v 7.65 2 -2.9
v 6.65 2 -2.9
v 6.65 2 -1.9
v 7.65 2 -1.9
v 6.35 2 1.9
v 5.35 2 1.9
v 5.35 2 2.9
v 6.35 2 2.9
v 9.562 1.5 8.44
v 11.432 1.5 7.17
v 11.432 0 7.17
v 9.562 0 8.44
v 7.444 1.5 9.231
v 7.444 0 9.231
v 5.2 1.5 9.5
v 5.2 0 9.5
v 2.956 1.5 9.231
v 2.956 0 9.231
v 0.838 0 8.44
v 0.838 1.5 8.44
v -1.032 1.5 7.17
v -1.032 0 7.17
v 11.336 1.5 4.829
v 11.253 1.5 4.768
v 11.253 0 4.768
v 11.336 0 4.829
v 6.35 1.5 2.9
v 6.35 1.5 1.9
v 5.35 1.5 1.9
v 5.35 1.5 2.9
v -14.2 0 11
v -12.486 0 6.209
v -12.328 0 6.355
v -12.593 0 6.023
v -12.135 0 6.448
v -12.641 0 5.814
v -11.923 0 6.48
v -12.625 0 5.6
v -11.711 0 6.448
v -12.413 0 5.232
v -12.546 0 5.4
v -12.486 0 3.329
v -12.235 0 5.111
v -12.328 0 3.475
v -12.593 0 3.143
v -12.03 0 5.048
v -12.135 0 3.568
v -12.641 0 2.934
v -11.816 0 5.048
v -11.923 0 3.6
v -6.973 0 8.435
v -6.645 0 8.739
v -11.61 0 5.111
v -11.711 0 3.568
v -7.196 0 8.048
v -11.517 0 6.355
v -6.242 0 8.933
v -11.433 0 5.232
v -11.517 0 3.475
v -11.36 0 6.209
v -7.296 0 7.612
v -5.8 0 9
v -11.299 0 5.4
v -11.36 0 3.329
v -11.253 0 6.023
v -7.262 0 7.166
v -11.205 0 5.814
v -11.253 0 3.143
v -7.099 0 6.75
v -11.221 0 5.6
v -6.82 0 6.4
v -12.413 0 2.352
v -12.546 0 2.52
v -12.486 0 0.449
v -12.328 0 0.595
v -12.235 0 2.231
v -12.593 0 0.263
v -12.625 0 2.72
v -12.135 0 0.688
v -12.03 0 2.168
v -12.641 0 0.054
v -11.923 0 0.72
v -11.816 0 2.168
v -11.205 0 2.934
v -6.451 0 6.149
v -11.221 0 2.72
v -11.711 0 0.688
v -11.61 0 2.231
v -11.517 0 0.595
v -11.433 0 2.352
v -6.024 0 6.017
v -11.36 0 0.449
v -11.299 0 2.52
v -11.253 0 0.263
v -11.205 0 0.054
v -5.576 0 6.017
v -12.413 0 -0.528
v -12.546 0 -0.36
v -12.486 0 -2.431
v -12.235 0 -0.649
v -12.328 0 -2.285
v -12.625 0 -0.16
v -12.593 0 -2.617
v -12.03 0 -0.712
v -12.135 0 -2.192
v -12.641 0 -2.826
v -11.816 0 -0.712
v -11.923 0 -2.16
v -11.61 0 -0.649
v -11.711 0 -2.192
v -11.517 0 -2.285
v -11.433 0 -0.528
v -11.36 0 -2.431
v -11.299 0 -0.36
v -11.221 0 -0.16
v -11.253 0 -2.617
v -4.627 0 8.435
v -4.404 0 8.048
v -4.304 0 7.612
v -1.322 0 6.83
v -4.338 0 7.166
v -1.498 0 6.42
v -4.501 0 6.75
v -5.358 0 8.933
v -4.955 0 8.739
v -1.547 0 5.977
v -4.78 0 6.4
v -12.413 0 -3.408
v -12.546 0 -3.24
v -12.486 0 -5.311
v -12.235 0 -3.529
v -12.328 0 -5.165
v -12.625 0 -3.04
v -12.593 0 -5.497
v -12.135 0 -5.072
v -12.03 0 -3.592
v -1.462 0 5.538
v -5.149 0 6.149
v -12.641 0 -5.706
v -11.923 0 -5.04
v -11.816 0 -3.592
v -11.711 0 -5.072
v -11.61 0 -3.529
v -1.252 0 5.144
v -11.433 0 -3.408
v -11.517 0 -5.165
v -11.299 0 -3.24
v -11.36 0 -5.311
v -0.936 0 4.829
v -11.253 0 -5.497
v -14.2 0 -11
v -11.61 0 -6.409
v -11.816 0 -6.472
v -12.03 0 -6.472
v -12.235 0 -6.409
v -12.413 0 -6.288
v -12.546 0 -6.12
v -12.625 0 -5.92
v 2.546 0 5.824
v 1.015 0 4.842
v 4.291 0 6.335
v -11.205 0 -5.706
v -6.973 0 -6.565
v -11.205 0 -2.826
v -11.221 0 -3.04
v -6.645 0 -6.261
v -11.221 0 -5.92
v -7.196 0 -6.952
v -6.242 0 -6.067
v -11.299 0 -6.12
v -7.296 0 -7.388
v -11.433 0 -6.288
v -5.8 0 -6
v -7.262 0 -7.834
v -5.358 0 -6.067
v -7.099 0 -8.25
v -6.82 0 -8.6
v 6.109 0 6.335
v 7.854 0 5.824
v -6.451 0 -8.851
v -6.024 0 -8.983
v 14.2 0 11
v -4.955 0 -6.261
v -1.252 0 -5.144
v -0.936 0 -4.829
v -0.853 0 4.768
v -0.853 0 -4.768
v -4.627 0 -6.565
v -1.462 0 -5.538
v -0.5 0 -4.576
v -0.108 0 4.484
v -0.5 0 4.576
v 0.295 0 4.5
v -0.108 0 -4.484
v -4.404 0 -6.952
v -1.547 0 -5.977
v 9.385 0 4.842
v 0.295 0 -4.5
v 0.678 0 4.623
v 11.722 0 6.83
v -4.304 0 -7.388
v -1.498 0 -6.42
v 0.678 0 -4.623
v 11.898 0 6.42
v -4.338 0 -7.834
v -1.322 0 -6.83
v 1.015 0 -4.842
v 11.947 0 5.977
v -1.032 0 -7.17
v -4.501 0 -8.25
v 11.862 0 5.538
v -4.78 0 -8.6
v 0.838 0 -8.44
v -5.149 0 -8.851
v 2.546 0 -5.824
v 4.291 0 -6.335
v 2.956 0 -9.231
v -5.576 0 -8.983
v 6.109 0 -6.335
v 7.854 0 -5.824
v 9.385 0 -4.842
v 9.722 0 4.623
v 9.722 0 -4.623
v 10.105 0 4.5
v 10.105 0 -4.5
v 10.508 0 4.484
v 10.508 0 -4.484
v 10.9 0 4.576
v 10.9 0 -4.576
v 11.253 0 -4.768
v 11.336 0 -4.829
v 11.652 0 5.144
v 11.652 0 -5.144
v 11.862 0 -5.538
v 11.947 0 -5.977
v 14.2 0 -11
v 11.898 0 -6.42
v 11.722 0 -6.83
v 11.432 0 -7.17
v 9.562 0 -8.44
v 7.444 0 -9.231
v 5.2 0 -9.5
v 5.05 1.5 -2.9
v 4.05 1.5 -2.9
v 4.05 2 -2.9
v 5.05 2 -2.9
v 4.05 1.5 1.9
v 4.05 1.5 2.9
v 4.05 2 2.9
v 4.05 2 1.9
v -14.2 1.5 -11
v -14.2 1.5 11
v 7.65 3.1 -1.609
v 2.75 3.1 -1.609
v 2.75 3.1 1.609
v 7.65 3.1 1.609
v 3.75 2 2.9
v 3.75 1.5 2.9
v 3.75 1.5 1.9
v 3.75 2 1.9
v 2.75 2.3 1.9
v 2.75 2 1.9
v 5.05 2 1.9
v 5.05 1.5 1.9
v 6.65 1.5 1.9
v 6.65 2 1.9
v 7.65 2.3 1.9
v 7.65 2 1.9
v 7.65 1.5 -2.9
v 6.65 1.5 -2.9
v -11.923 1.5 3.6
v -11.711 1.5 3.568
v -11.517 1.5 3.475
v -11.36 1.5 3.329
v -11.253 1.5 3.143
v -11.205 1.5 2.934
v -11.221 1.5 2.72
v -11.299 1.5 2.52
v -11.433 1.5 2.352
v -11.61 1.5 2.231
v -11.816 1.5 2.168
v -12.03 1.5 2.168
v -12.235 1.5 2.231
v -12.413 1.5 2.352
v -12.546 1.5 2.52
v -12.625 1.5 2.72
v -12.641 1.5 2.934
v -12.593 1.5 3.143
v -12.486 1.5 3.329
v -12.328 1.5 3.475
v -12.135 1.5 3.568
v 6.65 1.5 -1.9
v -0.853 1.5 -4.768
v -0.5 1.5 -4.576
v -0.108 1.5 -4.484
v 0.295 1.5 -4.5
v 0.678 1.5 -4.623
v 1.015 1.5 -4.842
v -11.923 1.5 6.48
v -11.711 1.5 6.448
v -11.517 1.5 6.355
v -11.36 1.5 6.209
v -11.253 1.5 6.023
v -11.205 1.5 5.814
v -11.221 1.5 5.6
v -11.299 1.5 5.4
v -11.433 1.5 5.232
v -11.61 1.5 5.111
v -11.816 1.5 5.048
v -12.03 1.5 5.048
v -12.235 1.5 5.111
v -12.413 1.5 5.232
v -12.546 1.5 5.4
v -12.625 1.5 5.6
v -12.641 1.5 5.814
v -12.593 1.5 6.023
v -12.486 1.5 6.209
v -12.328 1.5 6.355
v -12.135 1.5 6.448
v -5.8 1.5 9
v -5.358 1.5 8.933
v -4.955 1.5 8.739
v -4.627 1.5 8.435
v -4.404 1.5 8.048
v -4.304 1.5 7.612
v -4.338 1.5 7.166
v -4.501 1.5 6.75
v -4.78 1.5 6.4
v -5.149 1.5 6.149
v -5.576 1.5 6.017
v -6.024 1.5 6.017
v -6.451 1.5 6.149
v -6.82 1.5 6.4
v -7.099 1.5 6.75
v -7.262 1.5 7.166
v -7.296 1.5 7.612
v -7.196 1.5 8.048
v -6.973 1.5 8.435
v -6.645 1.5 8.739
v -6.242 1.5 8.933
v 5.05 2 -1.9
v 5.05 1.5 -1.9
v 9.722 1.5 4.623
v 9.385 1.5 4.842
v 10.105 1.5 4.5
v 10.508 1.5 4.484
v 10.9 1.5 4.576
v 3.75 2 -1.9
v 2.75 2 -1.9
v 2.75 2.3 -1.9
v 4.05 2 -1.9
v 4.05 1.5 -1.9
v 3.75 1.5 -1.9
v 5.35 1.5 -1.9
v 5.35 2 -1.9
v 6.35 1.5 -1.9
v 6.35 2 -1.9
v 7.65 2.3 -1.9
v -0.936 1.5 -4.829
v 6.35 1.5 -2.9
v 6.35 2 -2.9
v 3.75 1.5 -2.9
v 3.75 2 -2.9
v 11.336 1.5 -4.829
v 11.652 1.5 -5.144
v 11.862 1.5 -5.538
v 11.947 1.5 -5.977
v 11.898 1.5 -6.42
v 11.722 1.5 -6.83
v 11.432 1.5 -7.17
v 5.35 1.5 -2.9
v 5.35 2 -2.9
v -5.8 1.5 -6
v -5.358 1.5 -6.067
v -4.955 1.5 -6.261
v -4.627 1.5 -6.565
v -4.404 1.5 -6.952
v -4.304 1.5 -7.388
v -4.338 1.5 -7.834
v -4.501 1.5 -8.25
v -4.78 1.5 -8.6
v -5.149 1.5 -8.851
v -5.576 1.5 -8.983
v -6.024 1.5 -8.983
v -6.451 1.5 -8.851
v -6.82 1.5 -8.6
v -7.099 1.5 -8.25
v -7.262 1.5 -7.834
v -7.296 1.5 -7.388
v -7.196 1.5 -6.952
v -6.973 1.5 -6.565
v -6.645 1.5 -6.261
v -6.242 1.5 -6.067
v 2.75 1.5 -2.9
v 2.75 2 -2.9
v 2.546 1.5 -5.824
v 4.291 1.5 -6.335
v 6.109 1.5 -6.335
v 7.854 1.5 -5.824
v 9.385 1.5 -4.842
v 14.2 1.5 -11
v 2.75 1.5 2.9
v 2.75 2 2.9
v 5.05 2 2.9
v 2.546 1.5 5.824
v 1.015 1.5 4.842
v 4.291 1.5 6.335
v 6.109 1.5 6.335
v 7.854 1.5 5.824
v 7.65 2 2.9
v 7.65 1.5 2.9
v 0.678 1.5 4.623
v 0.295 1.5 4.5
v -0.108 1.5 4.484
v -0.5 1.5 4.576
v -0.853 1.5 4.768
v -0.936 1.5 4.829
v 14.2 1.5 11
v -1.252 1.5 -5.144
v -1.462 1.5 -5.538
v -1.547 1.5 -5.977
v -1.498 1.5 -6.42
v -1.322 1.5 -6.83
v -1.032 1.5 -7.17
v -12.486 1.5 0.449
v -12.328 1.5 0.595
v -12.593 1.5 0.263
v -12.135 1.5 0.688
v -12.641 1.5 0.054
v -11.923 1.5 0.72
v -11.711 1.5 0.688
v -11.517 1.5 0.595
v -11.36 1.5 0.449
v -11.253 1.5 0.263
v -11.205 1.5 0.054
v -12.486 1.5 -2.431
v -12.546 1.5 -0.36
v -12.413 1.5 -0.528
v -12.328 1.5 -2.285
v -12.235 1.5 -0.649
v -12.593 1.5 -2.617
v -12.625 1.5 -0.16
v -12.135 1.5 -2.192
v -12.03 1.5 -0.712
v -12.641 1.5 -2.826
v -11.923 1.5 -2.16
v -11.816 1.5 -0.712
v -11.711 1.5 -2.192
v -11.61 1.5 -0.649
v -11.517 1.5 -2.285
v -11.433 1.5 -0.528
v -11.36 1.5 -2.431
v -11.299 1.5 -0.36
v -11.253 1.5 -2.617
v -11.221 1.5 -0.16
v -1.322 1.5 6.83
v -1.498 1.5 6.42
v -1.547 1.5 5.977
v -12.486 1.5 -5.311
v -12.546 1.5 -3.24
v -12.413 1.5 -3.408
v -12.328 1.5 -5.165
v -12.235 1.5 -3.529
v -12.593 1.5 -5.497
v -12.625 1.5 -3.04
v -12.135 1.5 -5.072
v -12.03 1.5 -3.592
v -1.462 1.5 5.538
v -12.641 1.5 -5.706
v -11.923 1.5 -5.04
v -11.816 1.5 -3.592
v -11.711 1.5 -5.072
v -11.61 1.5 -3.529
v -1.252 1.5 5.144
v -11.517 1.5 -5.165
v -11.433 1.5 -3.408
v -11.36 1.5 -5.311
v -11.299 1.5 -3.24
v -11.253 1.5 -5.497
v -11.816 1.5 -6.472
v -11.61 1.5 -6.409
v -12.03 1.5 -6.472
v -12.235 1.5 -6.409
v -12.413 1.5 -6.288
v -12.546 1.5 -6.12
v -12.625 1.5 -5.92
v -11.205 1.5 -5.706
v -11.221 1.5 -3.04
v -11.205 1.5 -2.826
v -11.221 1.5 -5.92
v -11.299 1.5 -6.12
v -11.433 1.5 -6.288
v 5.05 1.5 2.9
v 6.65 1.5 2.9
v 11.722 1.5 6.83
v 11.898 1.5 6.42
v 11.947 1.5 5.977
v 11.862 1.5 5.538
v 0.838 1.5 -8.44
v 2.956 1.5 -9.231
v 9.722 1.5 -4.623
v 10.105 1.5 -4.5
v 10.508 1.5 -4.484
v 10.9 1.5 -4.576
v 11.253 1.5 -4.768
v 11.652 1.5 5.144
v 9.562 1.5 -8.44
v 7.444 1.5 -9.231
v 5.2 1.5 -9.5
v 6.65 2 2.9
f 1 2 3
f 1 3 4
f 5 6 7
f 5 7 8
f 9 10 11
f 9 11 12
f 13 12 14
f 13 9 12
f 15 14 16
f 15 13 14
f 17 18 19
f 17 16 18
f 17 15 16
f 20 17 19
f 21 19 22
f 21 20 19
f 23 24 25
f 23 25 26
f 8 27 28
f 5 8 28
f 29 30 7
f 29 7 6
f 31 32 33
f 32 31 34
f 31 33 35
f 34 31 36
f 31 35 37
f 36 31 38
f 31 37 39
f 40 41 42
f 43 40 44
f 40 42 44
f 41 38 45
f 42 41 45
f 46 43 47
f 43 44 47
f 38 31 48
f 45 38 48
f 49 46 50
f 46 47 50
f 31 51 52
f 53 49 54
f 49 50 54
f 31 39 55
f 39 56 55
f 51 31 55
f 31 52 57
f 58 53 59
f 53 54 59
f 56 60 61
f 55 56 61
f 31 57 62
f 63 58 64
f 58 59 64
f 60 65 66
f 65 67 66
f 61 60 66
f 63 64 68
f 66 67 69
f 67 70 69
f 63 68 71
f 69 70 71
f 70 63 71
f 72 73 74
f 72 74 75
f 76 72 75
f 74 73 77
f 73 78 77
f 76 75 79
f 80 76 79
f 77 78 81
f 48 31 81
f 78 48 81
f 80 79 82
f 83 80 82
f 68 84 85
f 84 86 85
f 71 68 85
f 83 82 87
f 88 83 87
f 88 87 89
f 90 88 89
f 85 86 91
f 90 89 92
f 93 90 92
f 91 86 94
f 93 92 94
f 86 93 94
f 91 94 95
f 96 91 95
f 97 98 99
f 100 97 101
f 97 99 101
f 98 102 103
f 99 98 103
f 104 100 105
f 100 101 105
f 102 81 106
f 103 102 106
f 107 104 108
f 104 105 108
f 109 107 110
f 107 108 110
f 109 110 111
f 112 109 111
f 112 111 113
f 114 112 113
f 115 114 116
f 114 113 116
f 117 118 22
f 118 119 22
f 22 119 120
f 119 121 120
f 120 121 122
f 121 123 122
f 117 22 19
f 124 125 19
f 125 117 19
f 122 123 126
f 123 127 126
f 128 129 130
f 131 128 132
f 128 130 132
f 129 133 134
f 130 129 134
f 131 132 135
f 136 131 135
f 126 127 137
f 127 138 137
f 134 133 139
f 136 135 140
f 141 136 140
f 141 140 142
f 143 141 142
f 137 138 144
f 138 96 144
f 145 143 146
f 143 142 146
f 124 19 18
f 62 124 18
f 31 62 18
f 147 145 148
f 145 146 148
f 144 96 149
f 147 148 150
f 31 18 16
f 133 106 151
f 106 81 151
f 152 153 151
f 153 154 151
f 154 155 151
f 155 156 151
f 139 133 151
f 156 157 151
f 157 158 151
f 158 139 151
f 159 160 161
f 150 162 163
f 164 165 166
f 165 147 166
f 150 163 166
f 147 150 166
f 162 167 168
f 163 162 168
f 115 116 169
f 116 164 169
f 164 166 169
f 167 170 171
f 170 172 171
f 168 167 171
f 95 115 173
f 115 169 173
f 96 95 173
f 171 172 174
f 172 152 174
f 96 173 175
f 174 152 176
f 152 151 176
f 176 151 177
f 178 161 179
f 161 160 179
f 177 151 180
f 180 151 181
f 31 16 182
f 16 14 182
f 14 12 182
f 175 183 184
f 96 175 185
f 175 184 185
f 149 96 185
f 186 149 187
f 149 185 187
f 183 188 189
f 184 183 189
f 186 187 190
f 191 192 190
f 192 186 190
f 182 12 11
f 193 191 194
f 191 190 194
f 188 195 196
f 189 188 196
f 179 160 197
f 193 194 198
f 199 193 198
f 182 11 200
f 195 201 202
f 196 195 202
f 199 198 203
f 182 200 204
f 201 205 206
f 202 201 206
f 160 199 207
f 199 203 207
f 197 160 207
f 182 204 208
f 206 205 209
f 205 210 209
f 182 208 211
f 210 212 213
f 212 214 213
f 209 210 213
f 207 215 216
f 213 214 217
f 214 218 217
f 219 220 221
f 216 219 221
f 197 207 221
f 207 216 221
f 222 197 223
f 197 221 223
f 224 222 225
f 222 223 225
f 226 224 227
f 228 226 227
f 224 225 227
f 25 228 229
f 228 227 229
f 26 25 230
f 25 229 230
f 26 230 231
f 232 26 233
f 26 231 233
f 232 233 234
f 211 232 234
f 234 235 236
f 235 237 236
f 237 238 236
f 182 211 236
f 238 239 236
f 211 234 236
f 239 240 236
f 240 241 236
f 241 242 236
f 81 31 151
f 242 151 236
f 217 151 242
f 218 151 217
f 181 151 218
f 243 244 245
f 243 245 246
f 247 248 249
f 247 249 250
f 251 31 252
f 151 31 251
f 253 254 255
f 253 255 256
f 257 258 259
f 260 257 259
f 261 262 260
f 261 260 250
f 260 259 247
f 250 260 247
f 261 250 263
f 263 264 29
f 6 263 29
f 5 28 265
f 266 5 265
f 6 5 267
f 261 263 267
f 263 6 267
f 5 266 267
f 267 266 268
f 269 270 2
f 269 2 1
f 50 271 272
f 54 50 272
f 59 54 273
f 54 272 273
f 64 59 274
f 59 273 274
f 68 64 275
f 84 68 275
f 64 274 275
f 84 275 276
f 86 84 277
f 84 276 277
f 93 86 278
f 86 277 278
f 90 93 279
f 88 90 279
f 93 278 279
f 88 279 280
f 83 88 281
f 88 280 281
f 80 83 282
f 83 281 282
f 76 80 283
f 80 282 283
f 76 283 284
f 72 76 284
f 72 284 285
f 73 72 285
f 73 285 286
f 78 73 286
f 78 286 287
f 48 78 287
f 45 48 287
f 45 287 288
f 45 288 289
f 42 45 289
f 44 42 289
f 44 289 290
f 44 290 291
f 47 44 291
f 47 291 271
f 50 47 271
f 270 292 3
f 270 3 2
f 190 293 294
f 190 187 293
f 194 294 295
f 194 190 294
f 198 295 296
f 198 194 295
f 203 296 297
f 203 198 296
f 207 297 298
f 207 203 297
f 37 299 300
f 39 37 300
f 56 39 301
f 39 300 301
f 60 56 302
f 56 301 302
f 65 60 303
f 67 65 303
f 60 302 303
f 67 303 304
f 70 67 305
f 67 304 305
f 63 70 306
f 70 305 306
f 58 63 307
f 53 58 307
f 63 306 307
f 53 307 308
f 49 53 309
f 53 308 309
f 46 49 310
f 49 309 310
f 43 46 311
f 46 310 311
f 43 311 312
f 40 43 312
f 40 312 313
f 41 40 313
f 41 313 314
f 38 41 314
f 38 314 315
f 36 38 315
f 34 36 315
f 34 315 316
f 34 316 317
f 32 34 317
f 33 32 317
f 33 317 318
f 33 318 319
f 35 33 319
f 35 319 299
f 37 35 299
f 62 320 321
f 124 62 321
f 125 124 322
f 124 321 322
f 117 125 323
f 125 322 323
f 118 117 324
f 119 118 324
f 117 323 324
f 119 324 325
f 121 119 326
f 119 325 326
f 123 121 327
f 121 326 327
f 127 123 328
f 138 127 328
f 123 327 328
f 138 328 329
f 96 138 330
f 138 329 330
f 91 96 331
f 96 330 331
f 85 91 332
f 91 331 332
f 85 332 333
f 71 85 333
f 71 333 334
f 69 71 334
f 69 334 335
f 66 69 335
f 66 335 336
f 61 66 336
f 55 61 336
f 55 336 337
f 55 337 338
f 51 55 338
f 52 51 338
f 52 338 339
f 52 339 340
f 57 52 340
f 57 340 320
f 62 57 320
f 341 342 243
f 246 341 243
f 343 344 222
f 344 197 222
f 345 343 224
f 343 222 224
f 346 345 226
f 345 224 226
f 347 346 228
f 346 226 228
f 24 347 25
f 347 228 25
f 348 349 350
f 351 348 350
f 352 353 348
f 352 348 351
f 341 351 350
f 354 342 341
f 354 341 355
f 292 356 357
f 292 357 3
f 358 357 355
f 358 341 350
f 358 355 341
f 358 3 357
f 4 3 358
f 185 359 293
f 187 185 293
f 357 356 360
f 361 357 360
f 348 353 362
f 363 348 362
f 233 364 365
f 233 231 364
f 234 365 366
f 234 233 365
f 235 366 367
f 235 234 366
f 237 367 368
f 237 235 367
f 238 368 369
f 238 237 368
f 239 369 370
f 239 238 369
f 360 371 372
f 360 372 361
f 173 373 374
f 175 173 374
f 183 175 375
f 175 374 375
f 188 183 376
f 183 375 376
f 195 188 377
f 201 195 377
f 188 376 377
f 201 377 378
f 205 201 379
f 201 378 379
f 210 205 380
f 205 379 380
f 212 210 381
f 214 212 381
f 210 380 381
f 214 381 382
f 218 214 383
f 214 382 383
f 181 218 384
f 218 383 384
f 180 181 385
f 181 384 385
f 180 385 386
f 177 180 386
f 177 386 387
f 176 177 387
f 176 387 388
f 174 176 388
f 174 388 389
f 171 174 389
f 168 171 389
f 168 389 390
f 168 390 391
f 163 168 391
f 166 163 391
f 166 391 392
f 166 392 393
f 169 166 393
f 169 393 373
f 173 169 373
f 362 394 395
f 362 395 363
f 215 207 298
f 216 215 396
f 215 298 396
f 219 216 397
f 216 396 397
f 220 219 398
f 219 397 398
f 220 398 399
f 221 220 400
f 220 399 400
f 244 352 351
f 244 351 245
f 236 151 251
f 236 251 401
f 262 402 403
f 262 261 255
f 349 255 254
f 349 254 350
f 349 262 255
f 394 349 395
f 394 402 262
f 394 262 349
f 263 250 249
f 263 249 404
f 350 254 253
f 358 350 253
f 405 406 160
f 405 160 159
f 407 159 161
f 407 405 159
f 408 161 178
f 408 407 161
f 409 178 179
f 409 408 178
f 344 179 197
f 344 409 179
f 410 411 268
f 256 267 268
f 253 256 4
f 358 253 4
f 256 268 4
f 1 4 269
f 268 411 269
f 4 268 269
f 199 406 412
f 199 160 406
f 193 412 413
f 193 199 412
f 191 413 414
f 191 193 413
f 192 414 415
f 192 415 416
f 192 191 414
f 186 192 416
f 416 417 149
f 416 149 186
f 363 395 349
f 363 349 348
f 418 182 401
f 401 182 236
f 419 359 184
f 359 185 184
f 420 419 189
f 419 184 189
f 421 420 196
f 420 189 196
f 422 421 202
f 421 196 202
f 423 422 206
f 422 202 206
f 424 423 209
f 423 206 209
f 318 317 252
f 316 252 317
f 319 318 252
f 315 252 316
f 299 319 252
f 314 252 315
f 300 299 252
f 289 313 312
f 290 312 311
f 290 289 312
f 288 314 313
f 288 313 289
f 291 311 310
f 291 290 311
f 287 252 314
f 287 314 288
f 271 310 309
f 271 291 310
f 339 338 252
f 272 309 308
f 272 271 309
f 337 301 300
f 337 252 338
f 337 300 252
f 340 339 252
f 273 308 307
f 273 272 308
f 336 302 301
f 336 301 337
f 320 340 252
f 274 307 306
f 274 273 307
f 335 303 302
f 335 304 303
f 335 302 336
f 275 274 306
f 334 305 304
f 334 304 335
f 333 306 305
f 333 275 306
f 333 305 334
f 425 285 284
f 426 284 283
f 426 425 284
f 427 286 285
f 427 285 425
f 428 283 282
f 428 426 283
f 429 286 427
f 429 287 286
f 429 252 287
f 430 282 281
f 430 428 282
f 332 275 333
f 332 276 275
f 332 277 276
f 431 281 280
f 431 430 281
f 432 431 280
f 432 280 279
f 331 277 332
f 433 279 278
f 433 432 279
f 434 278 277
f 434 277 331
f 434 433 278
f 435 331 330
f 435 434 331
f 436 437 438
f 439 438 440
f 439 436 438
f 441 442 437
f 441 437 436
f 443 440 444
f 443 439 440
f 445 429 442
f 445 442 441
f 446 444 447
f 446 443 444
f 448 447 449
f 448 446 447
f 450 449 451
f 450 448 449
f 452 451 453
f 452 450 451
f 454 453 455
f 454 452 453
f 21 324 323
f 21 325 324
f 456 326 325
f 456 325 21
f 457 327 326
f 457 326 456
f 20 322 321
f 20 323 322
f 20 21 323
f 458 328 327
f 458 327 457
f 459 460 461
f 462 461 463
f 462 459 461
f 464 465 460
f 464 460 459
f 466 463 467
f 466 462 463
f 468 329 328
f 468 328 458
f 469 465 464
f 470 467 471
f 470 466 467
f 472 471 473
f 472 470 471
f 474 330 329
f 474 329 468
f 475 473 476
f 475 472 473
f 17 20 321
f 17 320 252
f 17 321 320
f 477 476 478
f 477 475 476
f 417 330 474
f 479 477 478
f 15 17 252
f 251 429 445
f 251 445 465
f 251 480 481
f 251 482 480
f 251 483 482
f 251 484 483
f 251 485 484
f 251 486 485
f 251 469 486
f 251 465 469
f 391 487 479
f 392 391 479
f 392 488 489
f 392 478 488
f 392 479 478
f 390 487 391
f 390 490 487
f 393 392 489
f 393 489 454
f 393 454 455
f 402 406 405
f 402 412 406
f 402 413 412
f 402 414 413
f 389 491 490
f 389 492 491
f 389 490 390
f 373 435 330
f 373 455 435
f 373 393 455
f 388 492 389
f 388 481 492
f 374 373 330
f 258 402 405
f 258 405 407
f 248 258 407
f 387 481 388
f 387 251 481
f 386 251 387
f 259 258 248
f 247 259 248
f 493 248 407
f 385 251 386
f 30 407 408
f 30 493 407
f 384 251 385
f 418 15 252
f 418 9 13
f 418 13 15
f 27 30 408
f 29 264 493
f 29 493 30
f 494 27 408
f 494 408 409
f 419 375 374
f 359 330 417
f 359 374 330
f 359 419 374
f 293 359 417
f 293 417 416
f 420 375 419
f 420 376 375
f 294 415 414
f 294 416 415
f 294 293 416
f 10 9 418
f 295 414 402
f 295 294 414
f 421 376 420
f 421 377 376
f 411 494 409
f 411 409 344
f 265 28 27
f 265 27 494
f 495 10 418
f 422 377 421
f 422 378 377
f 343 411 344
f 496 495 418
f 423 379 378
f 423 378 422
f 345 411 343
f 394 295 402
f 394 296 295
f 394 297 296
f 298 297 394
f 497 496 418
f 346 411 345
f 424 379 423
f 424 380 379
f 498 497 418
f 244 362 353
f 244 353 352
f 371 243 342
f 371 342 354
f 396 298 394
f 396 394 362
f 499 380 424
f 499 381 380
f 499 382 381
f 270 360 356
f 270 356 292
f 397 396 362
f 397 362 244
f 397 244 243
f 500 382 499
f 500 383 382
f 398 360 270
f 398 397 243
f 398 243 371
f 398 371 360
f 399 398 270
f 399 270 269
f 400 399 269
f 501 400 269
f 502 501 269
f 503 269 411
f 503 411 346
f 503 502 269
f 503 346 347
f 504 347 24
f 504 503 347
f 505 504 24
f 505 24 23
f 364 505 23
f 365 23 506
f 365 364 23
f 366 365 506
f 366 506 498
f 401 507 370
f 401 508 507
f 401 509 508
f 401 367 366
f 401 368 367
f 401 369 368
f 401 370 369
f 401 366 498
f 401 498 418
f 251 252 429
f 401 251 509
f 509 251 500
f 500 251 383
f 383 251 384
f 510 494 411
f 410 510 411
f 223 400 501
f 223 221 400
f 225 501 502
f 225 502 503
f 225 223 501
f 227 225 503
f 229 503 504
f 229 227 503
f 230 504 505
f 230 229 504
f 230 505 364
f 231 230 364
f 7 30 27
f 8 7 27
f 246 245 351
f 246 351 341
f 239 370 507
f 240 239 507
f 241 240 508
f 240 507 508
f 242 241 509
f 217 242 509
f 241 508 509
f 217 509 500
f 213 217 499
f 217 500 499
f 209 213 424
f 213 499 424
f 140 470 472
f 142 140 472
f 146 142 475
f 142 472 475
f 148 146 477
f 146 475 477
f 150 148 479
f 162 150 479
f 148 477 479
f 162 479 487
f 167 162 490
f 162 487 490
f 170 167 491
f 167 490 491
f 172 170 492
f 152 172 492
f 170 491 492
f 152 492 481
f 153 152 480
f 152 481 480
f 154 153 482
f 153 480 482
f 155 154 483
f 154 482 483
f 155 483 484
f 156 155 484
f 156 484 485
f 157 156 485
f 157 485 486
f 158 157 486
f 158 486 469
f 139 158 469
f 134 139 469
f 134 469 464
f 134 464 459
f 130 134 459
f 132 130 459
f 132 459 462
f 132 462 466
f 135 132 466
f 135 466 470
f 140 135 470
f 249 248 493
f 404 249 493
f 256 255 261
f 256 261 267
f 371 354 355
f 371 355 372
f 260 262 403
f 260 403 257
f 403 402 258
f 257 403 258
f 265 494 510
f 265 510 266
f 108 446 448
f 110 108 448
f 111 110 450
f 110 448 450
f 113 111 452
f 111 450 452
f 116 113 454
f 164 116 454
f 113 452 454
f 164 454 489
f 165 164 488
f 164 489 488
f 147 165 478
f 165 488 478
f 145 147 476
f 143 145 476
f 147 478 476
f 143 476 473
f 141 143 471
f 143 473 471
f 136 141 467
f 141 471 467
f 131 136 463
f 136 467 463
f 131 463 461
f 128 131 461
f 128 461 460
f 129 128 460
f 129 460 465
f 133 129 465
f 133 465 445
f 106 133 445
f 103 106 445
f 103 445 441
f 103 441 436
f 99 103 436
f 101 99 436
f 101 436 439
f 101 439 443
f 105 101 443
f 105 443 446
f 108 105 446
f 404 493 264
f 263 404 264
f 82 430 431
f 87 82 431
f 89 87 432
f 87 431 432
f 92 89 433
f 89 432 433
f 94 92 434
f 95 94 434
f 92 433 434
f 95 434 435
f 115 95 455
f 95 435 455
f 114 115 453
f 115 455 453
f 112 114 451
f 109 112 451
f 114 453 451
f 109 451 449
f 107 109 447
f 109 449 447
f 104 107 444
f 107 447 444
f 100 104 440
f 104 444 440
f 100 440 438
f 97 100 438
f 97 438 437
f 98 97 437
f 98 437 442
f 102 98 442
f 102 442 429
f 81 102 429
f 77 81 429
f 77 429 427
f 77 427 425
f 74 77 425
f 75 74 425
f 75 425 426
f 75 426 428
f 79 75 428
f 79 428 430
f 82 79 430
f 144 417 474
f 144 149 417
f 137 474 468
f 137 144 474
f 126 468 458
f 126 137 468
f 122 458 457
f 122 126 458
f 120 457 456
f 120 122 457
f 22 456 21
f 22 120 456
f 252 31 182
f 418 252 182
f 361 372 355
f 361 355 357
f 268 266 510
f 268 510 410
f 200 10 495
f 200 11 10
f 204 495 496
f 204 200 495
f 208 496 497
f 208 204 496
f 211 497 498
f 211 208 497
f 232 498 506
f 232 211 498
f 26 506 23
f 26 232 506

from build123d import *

# Parameters (mm, degrees)
SKETCH1_W             = 28.4
SKETCH1_H             = 22
BOSS_EXTRUDE1_DEPTH   = 1.5
SKETCH2_R             = 1.5
SKETCH2_R_2           = 0.72
CUT_EXTRUDE1_DEPTH    = 2.5
FILLET1_R             = 1.5
SKETCH3_W             = 4.9
SKETCH3_H             = 3.8
BOSS_EXTRUDE2_DEPTH   = 1.6
CHAMFER1_SIZE         = 0.8
CHAMFER1_SIZE2        = 0.291176187
CHAMFER1_PART_2_SIZE  = 0.8
CHAMFER1_PART_2_SIZE2 = 0.291176187
SKETCH6_W             = 1
SKETCH6_H             = 1
BOSS_EXTRUDE3_DEPTH   = 0.5


with BuildPart() as part:
    # Sketch1 → Boss-Extrude1 (new body)
    with BuildSketch(Plane(origin=(0, 0, 0), x_dir=(1, 0, 0), z_dir=(0, 1, 0))):
        Rectangle(SKETCH1_W, SKETCH1_H)
    extrude(amount=BOSS_EXTRUDE1_DEPTH)

    # Sketch2 → Cut-Extrude1 (cut, through all)
    with BuildSketch(Plane(origin=(0, 1.5, 0), x_dir=(1, 0, 0), z_dir=(0, 1, 0))):
        with Locations(Location((-5.8, 7.5, 0), (0, 0, 270))):  # turned: the seam where the file's is
            Circle(SKETCH2_R)
        with Locations(Location((-5.8, -7.5, 0), (0, 0, 270))):  # turned: the seam where the file's is
            Circle(SKETCH2_R)
        with Locations(Location((-11.92285327, 5.76, 0), (0, 0, 270))):  # turned: the seam where the file's is
            Circle(SKETCH2_R_2)
        with Locations(Location((-11.92285327, 2.88, 0), (0, 0, 270))):  # turned: the seam where the file's is
            Circle(SKETCH2_R_2)
        with Locations(Location((-11.92285327, 0, 0), (0, 0, 270))):  # turned: the seam where the file's is
            Circle(SKETCH2_R_2)
        with Locations(Location((-11.92285327, -2.88, 0), (0, 0, 270))):  # turned: the seam where the file's is
            Circle(SKETCH2_R_2)
        with Locations(Location((-11.92285327, -5.76, 0), (0, 0, 270))):  # turned: the seam where the file's is
            Circle(SKETCH2_R_2)
        with BuildLine():
            Line((-2.3, 5.830951895), (0.2, 3.994996871))
            ThreePointArc((0.2, 3.994996871), (5.2, 6.4), (10.2, 3.994996871))
            Line((10.2, 3.994996871), (12.7, 5.830951895))
            ThreePointArc((12.7, 5.830951895), (5.2, 9.5), (-2.3, 5.830951895))
        make_face()
        with BuildLine():
            Line((10.2, -3.994996871), (12.7, -5.830951895))
            ThreePointArc((12.7, -5.830951895), (5.2, -9.5), (-2.3, -5.830951895))
            Line((-2.3, -5.830951895), (0.2, -3.994996871))
            ThreePointArc((0.2, -3.994996871), (5.2, -6.4), (10.2, -3.994996871))
        make_face()
    extrude(amount=-CUT_EXTRUDE1_DEPTH, mode=Mode.SUBTRACT)

    # Fillet1
    fillet1_edges = [part.edges().sort_by_distance(p)[0] for p in [
        (-2.3, 0.75, -5.830951895),
        (12.7, 0.75, -5.830951895),
        (10.2, 0.75, -3.994996871),
        (0.2, 0.75, -3.994996871),
        (0.2, 0.75, 3.994996871),
        (10.2, 0.75, 3.994996871),
        (12.7, 0.75, 5.830951895),
        (-2.3, 0.75, 5.830951895),
    ]]
    fillet(fillet1_edges, radius=FILLET1_R)

    # Sketch3 → Boss-Extrude2 (add)
    with BuildSketch(Plane(origin=(0, 1.5, 0), x_dir=(1, 0, 0), z_dir=(0, 1, 0))):
        with Locations((5.2, 0)):
            Rectangle(SKETCH3_W, SKETCH3_H)
    extrude(amount=BOSS_EXTRUDE2_DEPTH)

    # Chamfer1
    chamfer1_edges = [part.edges().sort_by_distance(p)[0] for p in [
        (5.2, 3.1, 1.9),
    ]]
    chamfer1_side = [part.faces().sort_by_distance(p)[0] for p in [
        (5.2, 2.3, 1.9),
    ]]
    chamfer(chamfer1_edges, length=CHAMFER1_SIZE, length2=CHAMFER1_SIZE2, reference=chamfer1_side[0])

    # Chamfer1 part 2
    chamfer1_part_2_edges = [part.edges().sort_by_distance(p)[0] for p in [
        (5.2, 3.1, -1.9),
    ]]
    chamfer1_part_2_side = [part.faces().sort_by_distance(p)[0] for p in [
        (5.2, 2.3, -1.9),
    ]]
    chamfer(chamfer1_part_2_edges, length=CHAMFER1_PART_2_SIZE, length2=CHAMFER1_PART_2_SIZE2, reference=chamfer1_part_2_side[0])

    # Sketch6 → Boss-Extrude3 (add)
    with BuildSketch(Plane(origin=(0, 1.5, 0), x_dir=(1, 0, 0), z_dir=(0, 1, 0))):
        with Locations((3.25, -2.4)):
            Rectangle(SKETCH6_W, SKETCH6_H)
        with Locations((3.25, 2.4)):
            Rectangle(SKETCH6_W, SKETCH6_H)
        with Locations((4.55, -2.4)):
            Rectangle(SKETCH6_W, SKETCH6_H)
        with Locations((4.55, 2.4)):
            Rectangle(SKETCH6_W, SKETCH6_H)
        with Locations((5.85, -2.4)):
            Rectangle(SKETCH6_W, SKETCH6_H)
        with Locations((5.85, 2.4)):
            Rectangle(SKETCH6_W, SKETCH6_H)
        with Locations((7.15, -2.4)):
            Rectangle(SKETCH6_W, SKETCH6_H)
        with Locations((7.15, 2.4)):
            Rectangle(SKETCH6_W, SKETCH6_H)
    extrude(amount=BOSS_EXTRUDE3_DEPTH)


solid = part.part
